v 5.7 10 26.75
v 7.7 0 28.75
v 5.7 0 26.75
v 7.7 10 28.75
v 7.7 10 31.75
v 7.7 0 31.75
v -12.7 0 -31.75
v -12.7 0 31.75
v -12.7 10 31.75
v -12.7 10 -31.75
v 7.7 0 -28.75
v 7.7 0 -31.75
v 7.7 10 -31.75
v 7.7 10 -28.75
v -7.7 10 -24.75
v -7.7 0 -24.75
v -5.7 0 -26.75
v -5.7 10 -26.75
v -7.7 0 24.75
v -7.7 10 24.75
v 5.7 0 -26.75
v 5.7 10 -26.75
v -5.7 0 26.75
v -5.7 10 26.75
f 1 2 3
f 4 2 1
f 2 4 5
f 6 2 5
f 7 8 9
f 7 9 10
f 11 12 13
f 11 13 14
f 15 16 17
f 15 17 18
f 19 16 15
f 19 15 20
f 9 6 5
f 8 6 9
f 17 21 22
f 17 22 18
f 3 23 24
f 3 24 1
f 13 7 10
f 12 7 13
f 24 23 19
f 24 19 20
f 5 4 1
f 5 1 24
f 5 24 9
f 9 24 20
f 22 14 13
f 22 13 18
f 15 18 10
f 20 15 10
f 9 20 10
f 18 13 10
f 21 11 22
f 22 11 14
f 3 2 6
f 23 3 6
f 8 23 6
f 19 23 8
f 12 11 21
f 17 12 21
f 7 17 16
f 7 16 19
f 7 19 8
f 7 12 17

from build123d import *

# Parameters (mm, degrees)
BOSS_EXTRUDE1_DEPTH = 10
CHAMFER1_SIZE       = 2


with BuildPart() as part:
    # Sketch1 → Boss-Extrude1 (new body)
    with BuildSketch(Plane(origin=(0, 0, 0), x_dir=(1, 0, 0), z_dir=(0, 1, 0))):
        Polygon((7.7, 26.75), (-7.7, 26.75), (-7.7, -26.75), (7.7, -26.75), (7.7, -31.75), (-12.7, -31.75), (-12.7, 31.75), (7.7, 31.75), align=None)
    extrude(amount=BOSS_EXTRUDE1_DEPTH)

    # Chamfer1
    chamfer1_edges = [part.edges().sort_by_distance(p)[0] for p in [
        (7.7, 5, -26.75),
        (-7.7, 5, -26.75),
        (-7.7, 5, 26.75),
        (7.7, 5, 26.75),
    ]]
    chamfer(chamfer1_edges, length=CHAMFER1_SIZE)


solid = part.part
